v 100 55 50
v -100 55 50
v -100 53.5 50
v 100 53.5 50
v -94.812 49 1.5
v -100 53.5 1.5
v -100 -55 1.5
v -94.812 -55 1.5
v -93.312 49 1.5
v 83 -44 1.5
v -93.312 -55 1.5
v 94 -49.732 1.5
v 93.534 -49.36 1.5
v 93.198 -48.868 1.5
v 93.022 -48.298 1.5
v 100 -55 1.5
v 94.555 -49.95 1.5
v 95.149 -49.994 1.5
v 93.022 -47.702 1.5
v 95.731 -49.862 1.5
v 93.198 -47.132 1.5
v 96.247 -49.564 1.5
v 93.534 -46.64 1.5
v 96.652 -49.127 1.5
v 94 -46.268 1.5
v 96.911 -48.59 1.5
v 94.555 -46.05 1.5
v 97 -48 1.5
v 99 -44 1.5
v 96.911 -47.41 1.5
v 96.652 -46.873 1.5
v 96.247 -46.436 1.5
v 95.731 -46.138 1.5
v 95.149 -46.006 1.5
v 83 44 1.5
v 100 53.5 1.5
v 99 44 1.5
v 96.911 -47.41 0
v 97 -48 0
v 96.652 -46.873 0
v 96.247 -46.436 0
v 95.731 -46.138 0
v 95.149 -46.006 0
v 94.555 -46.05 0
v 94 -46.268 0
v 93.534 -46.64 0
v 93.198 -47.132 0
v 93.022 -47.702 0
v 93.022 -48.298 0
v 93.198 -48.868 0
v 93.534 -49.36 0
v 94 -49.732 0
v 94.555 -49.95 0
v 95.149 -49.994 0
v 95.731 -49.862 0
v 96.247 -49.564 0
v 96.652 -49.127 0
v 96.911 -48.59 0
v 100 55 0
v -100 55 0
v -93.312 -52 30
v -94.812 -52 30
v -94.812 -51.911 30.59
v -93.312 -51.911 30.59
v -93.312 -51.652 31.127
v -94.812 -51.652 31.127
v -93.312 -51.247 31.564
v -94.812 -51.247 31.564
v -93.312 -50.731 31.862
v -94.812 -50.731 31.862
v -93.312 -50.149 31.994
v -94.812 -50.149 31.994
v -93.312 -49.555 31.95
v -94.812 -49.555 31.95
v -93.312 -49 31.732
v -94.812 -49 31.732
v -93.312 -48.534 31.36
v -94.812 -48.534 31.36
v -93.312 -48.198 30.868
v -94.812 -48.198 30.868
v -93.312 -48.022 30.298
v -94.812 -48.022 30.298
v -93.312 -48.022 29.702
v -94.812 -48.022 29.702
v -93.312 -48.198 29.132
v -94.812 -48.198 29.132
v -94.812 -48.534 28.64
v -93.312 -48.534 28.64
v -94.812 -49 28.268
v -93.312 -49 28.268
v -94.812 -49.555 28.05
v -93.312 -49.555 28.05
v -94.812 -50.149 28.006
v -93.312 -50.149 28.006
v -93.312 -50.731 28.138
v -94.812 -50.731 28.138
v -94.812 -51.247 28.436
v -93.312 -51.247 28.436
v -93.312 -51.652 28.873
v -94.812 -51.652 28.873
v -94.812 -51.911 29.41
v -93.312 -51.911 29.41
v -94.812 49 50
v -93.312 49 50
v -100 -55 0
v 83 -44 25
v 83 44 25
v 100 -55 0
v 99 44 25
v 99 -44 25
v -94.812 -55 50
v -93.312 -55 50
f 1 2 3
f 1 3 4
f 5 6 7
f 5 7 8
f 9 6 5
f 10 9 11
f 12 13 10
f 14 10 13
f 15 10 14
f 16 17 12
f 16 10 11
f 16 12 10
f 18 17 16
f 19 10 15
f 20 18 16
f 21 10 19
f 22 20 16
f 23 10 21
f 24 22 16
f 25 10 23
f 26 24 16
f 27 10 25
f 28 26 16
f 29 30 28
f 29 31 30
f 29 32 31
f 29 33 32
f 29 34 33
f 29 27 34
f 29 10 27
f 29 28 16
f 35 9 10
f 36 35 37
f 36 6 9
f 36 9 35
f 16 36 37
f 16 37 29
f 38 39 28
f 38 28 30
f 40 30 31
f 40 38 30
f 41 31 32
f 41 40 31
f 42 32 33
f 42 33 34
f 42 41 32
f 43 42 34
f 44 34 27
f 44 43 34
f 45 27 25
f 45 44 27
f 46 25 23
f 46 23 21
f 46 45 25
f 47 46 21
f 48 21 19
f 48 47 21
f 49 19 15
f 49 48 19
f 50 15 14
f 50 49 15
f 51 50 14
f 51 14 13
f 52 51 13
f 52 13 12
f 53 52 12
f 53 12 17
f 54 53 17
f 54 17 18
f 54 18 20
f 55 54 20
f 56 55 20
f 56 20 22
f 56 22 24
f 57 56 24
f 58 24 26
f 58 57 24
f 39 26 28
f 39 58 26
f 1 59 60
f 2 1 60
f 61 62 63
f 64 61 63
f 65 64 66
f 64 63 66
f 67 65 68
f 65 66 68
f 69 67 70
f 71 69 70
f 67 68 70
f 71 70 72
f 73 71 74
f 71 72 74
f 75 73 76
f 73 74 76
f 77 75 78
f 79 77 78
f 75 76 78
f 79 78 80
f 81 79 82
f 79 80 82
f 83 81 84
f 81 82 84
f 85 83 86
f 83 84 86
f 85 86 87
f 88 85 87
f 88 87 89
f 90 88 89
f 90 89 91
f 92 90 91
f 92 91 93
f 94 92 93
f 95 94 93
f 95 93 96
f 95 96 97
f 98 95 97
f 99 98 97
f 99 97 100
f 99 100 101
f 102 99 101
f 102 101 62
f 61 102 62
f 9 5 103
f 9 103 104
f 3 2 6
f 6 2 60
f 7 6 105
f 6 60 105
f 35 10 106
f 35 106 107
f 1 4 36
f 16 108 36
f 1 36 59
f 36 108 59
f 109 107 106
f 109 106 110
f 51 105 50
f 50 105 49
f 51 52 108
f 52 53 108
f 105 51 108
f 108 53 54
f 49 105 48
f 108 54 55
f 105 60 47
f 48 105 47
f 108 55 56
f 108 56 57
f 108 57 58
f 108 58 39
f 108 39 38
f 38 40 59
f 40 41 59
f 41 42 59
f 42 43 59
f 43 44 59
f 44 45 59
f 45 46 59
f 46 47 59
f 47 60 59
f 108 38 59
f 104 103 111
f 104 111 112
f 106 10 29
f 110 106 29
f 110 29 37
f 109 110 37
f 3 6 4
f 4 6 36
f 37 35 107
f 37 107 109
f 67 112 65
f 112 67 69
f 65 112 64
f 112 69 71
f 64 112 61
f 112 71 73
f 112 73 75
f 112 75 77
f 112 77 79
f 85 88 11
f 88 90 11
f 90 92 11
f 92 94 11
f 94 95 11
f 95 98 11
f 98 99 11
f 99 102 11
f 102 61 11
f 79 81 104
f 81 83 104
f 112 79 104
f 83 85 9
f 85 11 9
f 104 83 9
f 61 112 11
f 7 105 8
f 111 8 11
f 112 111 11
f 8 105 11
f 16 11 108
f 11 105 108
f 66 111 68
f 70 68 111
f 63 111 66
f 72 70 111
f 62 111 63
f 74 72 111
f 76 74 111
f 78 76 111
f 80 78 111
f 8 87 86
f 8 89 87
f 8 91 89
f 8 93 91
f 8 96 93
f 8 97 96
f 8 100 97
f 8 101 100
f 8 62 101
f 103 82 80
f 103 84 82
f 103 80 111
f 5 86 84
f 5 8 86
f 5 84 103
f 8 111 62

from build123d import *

# Parameters (mm, degrees)
F0_R     = 2
F0_W     = 16
F0_H     = 88
F2_DEPTH = 1.5
F0_W_2   = 1.5
F0_H_2   = 104
F3_DEPTH = 50
F4_DEPTH = 25
F5_D     = 4


# Not quite as in the source:
# - the program builds the solid bodies; features that only make, move or delete a surface that nothing else refers to are left out


with BuildPart() as f2:
    # F0 (on Top) → F2 (new body)
    with BuildSketch(Plane.XY):
        Polygon((100, 53.5), (-100, 53.5), (-100, -55), (-94.811744988, -55), (-94.811744988, 49), (-93.311744988, 49), (-93.311744988, -55), (100, -55), align=None)
        with Locations((95, -48)):
            Circle(F0_R, mode=Mode.SUBTRACT)
        with Locations((91, 0)):
            Rectangle(F0_W, F0_H, mode=Mode.SUBTRACT)
        with Locations((91, 0)):
            Rectangle(F0_W, F0_H)
    extrude(amount=F2_DEPTH)

    # F0 (on Top) → F3 (join)
    with BuildSketch(Plane.XY):
        Polygon((-58.6367584765, 55), (-100, 55), (-100, 53.5), (100, 53.5), (100, 55), (72.2615793347, 55), align=None)
        with Locations((-94.061744988, -3)):
            Rectangle(F0_W_2, F0_H_2)
    extrude(amount=F3_DEPTH)

    # F0 (on Top) → F4 (join)
    with BuildSketch(Plane.XY):
        with Locations((91, 0)):
            Rectangle(F0_W, F0_H)
    extrude(amount=F4_DEPTH)

    # F5 (through all)
    with Locations(Plane.YZ):
        with Locations((-50, 30)):
            Hole(F5_D / 2)


solid = f2.part
